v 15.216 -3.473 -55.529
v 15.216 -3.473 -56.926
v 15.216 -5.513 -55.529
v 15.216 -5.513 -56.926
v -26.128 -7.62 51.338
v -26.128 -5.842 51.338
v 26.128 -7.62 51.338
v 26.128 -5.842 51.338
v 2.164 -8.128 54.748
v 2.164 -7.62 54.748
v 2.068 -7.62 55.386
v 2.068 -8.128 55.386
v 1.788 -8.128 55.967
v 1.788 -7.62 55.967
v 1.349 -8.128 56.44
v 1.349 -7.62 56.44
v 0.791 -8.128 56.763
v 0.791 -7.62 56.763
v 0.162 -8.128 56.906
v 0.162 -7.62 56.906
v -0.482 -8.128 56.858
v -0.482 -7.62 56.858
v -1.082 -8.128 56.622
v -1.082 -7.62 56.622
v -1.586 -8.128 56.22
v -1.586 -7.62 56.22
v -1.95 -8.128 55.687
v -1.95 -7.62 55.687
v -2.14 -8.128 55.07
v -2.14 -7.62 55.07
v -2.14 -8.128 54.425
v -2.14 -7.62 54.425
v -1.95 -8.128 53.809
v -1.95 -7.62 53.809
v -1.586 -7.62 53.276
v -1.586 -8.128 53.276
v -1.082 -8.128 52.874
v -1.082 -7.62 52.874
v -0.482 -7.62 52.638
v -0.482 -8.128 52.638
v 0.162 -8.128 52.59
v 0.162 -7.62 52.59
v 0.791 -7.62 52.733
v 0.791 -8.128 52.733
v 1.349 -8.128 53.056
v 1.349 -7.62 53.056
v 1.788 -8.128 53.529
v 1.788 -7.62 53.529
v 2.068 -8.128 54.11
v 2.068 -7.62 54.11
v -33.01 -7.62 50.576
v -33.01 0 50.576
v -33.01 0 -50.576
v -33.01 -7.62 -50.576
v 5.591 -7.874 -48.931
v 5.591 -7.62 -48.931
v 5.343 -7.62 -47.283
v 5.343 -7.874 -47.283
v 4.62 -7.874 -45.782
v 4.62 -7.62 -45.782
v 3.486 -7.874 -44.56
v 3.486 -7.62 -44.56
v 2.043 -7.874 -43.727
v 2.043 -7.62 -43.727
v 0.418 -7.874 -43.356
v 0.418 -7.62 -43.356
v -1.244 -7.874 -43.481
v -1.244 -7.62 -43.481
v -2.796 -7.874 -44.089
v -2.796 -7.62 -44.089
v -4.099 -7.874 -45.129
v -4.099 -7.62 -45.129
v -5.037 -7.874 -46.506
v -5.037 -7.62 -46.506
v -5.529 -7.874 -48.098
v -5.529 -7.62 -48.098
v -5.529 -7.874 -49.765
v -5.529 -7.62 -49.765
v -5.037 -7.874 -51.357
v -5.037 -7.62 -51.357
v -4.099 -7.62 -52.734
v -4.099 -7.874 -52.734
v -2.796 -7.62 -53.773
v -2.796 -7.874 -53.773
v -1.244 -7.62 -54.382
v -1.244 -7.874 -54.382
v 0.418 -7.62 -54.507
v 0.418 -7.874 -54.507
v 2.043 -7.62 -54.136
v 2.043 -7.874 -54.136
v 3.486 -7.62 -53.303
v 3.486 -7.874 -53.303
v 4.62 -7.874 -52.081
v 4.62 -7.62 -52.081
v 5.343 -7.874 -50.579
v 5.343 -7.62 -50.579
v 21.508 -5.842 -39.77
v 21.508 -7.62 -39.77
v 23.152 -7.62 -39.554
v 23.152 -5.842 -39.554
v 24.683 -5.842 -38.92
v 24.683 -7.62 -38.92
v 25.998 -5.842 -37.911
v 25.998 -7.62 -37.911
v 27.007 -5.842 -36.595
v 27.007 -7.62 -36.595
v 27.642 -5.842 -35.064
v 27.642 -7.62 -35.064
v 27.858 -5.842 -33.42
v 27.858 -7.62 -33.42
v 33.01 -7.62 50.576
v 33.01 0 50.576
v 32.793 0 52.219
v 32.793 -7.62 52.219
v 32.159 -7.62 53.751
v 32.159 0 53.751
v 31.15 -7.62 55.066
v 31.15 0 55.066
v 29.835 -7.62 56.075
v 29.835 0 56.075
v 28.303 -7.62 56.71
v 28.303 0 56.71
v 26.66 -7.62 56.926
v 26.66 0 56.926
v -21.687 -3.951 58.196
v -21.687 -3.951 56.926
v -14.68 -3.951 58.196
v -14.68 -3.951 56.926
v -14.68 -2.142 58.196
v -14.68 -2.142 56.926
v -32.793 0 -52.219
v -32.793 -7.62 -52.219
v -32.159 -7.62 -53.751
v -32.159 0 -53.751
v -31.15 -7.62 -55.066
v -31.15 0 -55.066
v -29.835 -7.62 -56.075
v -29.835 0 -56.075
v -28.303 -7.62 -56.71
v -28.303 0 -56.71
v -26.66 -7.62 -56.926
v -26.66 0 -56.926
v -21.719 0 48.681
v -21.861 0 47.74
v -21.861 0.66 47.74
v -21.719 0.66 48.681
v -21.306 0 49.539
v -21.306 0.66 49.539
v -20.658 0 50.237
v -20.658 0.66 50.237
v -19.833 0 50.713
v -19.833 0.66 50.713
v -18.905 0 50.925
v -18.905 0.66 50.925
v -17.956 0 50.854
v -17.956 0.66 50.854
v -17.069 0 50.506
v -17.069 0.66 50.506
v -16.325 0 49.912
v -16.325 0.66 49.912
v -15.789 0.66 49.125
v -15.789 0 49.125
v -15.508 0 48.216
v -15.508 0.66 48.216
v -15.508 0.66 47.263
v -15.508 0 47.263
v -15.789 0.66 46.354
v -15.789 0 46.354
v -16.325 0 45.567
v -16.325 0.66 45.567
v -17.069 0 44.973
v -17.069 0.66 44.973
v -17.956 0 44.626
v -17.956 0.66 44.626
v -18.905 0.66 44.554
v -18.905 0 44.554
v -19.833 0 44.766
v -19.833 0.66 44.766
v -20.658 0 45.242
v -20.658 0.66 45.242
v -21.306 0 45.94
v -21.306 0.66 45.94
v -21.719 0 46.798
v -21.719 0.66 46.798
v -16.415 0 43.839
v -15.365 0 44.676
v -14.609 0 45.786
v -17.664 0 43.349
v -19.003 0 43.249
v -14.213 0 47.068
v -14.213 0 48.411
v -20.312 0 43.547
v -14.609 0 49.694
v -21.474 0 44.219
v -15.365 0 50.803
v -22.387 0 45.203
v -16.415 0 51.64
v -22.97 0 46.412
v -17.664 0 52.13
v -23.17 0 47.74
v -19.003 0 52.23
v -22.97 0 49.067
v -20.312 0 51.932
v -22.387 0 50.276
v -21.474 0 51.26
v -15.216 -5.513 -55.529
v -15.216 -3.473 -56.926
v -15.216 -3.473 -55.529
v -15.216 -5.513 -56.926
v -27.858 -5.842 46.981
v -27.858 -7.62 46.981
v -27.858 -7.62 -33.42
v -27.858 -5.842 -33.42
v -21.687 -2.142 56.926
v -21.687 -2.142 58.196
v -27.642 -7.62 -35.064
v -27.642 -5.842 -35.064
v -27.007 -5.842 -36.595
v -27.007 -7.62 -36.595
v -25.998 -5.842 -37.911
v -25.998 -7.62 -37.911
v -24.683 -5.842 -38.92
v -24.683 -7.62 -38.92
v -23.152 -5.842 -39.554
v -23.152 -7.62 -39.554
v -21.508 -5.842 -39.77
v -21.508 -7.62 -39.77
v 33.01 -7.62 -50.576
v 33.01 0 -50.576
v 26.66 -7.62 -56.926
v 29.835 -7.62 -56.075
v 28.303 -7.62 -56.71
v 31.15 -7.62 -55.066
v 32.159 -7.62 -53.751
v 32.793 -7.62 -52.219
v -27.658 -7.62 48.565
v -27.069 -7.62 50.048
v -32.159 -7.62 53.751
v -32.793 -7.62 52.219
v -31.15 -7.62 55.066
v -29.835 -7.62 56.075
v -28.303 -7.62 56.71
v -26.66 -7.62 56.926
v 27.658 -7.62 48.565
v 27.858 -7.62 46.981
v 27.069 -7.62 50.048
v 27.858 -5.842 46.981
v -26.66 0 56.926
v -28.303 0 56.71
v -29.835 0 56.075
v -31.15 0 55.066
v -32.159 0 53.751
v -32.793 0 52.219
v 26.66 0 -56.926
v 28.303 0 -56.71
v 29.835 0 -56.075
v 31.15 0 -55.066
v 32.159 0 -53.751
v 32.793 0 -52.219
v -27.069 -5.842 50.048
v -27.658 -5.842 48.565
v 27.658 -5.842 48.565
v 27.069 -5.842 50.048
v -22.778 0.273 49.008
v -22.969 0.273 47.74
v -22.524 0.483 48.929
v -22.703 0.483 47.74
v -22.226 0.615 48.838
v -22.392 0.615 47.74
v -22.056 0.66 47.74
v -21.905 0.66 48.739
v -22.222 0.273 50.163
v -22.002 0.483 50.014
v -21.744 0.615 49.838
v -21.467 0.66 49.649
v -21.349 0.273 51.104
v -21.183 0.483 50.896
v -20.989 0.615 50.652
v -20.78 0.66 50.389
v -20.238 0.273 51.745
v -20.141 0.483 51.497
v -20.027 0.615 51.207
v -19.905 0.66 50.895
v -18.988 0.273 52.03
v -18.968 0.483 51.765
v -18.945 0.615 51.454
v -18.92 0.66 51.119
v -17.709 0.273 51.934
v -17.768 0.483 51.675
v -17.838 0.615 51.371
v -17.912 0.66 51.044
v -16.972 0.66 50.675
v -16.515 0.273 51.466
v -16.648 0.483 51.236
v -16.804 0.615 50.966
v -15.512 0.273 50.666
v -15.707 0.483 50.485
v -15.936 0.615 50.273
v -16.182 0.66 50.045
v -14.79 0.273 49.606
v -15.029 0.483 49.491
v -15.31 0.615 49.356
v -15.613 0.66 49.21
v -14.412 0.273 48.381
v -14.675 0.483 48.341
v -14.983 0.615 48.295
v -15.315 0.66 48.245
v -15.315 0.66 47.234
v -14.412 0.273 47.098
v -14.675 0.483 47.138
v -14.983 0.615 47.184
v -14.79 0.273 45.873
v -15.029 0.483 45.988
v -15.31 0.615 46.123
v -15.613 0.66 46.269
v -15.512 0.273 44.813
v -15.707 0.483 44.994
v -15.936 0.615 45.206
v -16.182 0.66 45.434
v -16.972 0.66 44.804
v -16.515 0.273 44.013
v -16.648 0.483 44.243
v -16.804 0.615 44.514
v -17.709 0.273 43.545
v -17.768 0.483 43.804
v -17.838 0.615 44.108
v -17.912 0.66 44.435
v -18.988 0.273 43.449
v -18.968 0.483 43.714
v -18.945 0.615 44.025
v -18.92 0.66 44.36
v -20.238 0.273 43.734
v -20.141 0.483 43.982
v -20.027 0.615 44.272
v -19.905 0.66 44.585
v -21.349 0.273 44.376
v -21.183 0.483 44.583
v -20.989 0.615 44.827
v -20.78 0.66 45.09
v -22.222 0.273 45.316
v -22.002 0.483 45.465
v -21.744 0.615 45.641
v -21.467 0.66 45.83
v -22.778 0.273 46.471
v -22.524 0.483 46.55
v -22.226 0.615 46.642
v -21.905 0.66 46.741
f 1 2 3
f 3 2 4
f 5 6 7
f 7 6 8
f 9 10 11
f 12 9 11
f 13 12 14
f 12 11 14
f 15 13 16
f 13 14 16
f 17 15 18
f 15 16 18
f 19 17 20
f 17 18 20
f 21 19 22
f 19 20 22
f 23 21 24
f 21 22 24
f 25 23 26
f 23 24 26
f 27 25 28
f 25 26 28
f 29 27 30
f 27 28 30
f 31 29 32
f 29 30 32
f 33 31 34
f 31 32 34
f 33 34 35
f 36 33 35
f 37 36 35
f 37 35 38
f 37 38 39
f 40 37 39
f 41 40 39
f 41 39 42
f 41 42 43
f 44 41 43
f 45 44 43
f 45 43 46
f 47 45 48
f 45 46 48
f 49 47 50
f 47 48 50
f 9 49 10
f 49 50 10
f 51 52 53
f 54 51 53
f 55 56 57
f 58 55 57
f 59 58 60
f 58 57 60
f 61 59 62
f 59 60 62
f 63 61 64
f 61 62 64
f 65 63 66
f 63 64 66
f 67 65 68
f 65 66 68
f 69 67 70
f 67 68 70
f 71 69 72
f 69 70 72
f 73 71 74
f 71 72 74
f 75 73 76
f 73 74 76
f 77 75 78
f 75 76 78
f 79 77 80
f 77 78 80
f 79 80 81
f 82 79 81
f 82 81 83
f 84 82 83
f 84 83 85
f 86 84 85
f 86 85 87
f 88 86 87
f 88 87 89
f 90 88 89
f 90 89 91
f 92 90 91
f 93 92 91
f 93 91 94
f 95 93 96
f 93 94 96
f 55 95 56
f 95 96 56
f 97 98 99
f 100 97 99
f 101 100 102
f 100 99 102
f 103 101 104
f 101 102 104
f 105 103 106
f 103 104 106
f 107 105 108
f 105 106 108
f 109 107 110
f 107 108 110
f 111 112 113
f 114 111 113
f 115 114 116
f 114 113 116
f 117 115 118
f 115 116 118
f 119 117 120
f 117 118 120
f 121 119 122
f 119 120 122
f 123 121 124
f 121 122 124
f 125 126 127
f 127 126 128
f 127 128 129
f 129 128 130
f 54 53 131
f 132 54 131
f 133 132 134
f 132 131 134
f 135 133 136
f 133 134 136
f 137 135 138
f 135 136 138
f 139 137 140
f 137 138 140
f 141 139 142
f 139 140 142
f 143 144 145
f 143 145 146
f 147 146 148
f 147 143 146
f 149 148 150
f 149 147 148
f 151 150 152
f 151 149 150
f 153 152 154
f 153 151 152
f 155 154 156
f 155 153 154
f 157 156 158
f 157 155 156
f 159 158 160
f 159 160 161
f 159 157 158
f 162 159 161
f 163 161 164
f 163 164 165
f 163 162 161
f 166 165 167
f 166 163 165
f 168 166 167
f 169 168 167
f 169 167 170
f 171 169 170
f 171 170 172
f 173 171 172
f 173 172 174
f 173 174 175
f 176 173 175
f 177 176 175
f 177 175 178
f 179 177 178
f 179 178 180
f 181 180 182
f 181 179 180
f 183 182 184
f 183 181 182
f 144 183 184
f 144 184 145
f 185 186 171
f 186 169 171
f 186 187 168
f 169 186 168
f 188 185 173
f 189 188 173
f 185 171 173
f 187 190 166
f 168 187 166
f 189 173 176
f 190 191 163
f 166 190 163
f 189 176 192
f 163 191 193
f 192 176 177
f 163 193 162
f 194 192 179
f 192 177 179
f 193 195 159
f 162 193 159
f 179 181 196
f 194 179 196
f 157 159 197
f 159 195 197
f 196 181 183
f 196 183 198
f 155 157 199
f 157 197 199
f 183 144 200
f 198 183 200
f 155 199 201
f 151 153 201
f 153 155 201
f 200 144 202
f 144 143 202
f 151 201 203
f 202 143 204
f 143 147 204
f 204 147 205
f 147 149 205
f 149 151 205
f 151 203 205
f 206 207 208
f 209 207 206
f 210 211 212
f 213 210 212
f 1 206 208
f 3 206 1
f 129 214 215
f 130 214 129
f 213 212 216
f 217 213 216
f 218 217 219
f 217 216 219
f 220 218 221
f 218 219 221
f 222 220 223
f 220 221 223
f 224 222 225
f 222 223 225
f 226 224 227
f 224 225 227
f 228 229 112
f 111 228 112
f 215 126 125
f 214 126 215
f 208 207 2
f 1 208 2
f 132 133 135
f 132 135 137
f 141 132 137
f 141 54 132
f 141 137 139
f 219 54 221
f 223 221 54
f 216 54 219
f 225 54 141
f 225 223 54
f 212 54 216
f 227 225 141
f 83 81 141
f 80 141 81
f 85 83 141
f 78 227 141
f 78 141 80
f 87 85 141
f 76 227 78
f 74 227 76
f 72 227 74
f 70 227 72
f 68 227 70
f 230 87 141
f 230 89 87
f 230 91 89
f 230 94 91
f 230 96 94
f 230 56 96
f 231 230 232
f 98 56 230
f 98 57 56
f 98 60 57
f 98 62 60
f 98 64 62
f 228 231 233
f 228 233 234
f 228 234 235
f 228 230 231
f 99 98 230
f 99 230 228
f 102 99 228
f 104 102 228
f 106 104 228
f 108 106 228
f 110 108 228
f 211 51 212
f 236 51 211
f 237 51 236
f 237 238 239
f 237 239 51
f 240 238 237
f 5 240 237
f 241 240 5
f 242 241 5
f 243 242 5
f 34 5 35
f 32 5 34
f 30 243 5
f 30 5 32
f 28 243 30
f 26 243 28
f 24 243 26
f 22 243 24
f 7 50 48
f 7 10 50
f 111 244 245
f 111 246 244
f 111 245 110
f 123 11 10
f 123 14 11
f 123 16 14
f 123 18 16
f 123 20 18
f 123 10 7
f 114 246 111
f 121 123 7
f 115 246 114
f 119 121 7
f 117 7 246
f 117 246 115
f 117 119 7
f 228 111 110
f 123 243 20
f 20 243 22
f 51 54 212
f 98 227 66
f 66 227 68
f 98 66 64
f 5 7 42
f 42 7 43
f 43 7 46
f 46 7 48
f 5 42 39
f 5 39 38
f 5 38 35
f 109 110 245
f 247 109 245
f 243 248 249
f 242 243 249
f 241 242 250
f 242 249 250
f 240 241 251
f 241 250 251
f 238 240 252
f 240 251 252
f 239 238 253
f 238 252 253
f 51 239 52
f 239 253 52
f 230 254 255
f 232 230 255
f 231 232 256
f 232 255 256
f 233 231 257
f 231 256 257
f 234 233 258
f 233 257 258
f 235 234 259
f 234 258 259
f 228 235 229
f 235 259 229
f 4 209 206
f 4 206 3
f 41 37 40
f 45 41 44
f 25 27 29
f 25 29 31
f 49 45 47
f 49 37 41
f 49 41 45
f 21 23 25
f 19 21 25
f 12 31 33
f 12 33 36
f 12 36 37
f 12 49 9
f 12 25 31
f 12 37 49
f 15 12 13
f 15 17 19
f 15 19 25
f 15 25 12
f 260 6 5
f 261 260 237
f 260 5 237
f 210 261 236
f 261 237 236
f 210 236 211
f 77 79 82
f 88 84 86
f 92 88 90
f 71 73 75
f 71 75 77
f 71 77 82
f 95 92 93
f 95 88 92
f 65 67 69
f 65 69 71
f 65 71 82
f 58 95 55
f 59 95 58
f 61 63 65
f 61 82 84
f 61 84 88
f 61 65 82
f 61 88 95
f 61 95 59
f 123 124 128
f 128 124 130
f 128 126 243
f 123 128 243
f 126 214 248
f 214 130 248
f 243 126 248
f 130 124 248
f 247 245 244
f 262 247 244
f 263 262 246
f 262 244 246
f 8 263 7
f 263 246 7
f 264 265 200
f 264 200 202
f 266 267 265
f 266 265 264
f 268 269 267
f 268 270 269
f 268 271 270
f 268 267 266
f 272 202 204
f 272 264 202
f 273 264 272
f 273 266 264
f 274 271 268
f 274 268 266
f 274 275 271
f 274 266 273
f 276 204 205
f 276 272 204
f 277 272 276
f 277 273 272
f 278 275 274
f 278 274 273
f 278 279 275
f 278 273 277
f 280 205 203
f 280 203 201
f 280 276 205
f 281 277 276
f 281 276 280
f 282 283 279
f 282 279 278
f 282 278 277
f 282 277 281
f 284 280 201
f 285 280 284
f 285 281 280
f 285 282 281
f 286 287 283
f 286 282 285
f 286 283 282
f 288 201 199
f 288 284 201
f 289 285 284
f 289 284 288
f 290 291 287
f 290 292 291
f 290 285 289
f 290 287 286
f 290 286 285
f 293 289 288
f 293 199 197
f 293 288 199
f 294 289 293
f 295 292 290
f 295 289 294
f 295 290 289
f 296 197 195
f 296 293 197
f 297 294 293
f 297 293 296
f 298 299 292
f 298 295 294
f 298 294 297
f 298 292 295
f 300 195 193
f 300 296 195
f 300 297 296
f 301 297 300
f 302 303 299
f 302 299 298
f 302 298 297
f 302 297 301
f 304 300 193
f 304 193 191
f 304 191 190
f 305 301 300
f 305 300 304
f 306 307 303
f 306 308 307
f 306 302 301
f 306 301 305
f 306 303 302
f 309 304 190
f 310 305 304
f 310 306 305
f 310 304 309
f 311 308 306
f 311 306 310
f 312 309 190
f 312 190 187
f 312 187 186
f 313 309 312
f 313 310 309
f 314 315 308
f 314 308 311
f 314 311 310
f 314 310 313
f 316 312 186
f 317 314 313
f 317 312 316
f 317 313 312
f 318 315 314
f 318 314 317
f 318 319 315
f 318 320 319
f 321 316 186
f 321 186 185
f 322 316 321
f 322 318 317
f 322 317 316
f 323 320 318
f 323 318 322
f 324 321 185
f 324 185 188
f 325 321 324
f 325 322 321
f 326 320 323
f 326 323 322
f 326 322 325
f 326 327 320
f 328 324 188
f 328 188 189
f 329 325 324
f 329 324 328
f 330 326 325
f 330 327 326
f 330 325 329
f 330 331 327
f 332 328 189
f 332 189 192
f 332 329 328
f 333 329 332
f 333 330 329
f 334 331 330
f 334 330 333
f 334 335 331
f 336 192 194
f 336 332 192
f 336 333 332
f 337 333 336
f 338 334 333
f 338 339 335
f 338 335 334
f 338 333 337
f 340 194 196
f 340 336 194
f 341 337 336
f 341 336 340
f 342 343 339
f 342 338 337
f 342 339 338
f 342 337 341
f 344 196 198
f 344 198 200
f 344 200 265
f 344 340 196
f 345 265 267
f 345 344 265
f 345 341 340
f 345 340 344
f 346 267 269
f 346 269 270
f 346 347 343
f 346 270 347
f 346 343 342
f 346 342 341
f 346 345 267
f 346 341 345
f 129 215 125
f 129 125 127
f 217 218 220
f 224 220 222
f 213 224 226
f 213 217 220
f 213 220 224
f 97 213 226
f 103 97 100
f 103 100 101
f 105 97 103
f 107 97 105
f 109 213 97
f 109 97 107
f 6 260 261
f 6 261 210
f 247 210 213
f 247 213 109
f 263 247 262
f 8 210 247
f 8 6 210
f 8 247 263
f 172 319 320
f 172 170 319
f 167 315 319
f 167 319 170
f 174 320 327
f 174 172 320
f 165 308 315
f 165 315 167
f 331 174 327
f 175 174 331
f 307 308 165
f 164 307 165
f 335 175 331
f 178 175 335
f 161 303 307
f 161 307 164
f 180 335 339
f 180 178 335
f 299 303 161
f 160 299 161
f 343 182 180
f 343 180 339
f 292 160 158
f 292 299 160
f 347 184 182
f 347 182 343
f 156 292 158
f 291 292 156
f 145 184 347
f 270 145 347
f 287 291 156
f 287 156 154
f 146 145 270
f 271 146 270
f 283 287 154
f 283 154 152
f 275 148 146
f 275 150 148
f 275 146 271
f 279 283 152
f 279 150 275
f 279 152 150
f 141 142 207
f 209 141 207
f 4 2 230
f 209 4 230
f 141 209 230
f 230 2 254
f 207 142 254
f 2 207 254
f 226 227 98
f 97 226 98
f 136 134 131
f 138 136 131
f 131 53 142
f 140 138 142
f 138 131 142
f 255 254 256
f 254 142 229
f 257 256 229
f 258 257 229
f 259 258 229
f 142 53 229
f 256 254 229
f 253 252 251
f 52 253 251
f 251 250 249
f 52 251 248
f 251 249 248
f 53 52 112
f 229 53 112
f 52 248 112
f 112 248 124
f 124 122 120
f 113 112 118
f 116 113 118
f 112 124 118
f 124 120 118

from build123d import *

# Parameters (mm, degrees)
F1_DEPTH   = 7.62
F3_DEPTH   = 1.778
F4_R       = 5.5910358915
F6_DEPTH   = 0.254
F11_W      = 5.8401450515
F11_H      = 0.8899270086
F12_DEPTH  = 0.254
F13_W      = 53.3195276141
F13_H      = 7.62
F13_W_2    = 3.7960950285
F13_H_2    = 0.8621166
F14_DEPTH  = 5.588
F15_W      = 5.4543595761
F15_H      = 1.4679813758
F16_DEPTH  = 2.921
F17_W      = 7.0071518421
F17_H      = 1.8082973547
F18_DEPTH  = 1.27
F19_R      = 2.1642296788
F20_DEPTH  = 0.508
F21_R      = 3.8279673228
F22_DEPTH  = 2.286
F23_R      = 4.5034446875
F23_R_2    = 3.1940667159
F24_DEPTH  = 0.6604
F26_W      = 9.0522272512
F26_H      = 1.7520438414
F27_DEPTH  = 12.192
F1_FACE2_W = 53.3195276141
F1_FACE2_H = 7.62
F28_DEPTH  = 1.27
F29_W      = 17.2284310684
F29_H      = 1.4600362629
F30_DEPTH  = 3.048
F31_W      = 53.3195276141
F31_H      = 7.62
F31_W_2    = 12.5563140027
F31_H_2    = 1.4600367285
F32_DEPTH  = 1.27
F33_W      = 30.4326713085
F33_H      = 2.039485611
F34_DEPTH  = 1.27
F35_DEPTH  = 2.667


# Not quite as in the source:
# - a fillet or chamfer that OpenCascade refuses, or shapes differently, is made with other operations: its cross-section is extruded or revolved along the edge and cut away or added
# - the program builds the solid bodies; features that only make, move or delete a surface that nothing else refers to are left out


with BuildPart() as f1:
    # F0 (on Front) → F1 (new body)
    with BuildSketch(Plane.XZ):
        with BuildLine():
            ThreePointArc((33.0097638071, 50.5758779287), (31.1498918676, 55.0660059893), (26.6597638071, 56.9258779287))
            Line((26.6597638071, 56.9258779287), (-26.6597638071, 56.9258779287))
            ThreePointArc((-26.6597638071, 56.9258779287), (-31.1498918676, 55.0660059893), (-33.0097638071, 50.5758779287))
            Line((-33.0097638071, 50.5758779287), (-33.0097638071, -50.5758779287))
            ThreePointArc((-33.0097638071, -50.5758779287), (-31.1498918676, -55.0660059893), (-26.6597638071, -56.9258779287))
            Line((-26.6597638071, -56.9258779287), (26.6597638071, -56.9258779287))
            ThreePointArc((26.6597638071, -56.9258779287), (31.1498918676, -55.0660059893), (33.0097638071, -50.5758779287))
            Line((33.0097638071, -50.5758779287), (33.0097638071, 50.5758779287))
        make_face()
    extrude(amount=F1_DEPTH)

    # F2 (on face) → F3 (cut)
    with BuildSketch(Plane.XZ.offset(7.62)):
        with BuildLine():
            ThreePointArc((27.8582237661, 46.9814757049), (25.9983518266, 51.4716037654), (21.5082237661, 53.3314757049))
            Line((21.5082237661, 53.3314757049), (-21.5082237661, 53.3314757049))
            ThreePointArc((-21.5082237661, 53.3314757049), (-25.9983518266, 51.4716037654), (-27.8582237661, 46.9814757049))
            Line((-27.8582237661, 46.9814757049), (-27.8582237661, -33.4204429924))
            ThreePointArc((-27.8582237661, -33.4204429924), (-25.9983518266, -37.910571053), (-21.5082237661, -39.7704429924))
            Line((-21.5082237661, -39.7704429924), (21.5082237661, -39.7704429924))
            ThreePointArc((21.5082237661, -39.7704429924), (25.9983518266, -37.910571053), (27.8582237661, -33.4204429924))
            Line((27.8582237661, -33.4204429924), (27.8582237661, 46.9814757049))
        make_face()
    extrude(amount=-F3_DEPTH, mode=Mode.SUBTRACT)

    # F4 (on face) → F6 (join)
    with BuildSketch(Plane.XZ.offset(7.62)):
        with Locations((0, -48.9313825965)):
            Circle(F4_R)
    extrude(amount=F6_DEPTH)

    # F11 (on face) → F12 (join)
    with BuildSketch(Plane.XY.offset(56.9258779287)):
        with Locations((20.8248868585, -3.3650364957)):
            Rectangle(F11_W, F11_H)
    extrude(amount=-F12_DEPTH)

    # F13 (on face) → F14 (join)
    with BuildSketch(Plane.XY.offset(56.9258779287)):
        with Locations((0, -3.81)):
            Rectangle(F13_W, F13_H)
        with Locations((21.5549049899, -4.2410583)):
            Rectangle(F13_W_2, F13_H_2, mode=Mode.SUBTRACT)
    extrude(amount=-F14_DEPTH)

    # F15 (on face) → F16 (join)
    with BuildSketch(Plane.XY.offset(56.9258779287)):
        with Locations((18.7206258997, -3.3238437027)):
            Rectangle(F15_W, F15_H)
    extrude(amount=-F16_DEPTH)

    # F17 (on face) → F18 (join)
    with BuildSketch(Plane.XY.offset(56.9258779287)):
        with Locations((-18.1839093566, -3.046388505)):
            Rectangle(F17_W, F17_H)
    extrude(amount=F18_DEPTH)

    # F19 (on face) → F20 (join)
    with BuildSketch(Plane.XZ.offset(7.62)):
        with Locations((0, 54.7479093075)):
            Circle(F19_R)
    extrude(amount=F20_DEPTH)

    # F21 (on face) → F22 (join)
    with BuildSketch(Plane(origin=(0, 0, 0), x_dir=(-1, 0, 0), z_dir=(0, 1, 0))):
        with Locations((24.0557044744, 50.6977252662)):
            Circle(F21_R)
    extrude(amount=-F22_DEPTH)

    # F26 (on face) → F27 (join)
    with BuildSketch(Plane(origin=(0, 0, -56.9258779287), x_dir=(1, 0, 0), z_dir=(0, 0, -1))):
        with Locations((1.1143940501, 4.3801093707)):
            Rectangle(F26_W, F26_H)
    extrude(amount=-F27_DEPTH)

    # F1_face2 (on face) + F26 (on face) → F28 (join)
    with BuildSketch(Plane(origin=(0, -3.81, -56.9258779287), x_dir=(1, 0, 0), z_dir=(0, 0, -1))):
        Rectangle(F1_FACE2_W, F1_FACE2_H)
    with BuildSketch(Plane(origin=(0, 0, -56.9258779287), x_dir=(1, 0, 0), z_dir=(0, 0, -1))):
        with Locations((1.1143940501, 4.3801093707)):
            Rectangle(F26_W, F26_H)
    extrude(amount=-F28_DEPTH)

    # F29 (on face) → F30 (join)
    with BuildSketch(Plane(origin=(0, 0, -56.9258779287), x_dir=(1, 0, 0), z_dir=(0, 0, -1))):
        with Locations((1.1143931188, 4.52611316)):
            Rectangle(F29_W, F29_H)
    extrude(amount=-F30_DEPTH)

    # F31 (on face) → F32 (join)
    with BuildSketch(Plane(origin=(0, 0, -56.9258779287), x_dir=(1, 0, 0), z_dir=(0, 0, -1))):
        with Locations((0, 3.81)):
            Rectangle(F31_W, F31_H)
        with Locations((2.5744300801, 4.8181207385)):
            Rectangle(F31_W_2, F31_H_2, mode=Mode.SUBTRACT)
    extrude(amount=-F32_DEPTH)

    # F33 (on face) → F34 (join)
    with BuildSketch(Plane(origin=(0, 0, -56.9258779287), x_dir=(1, 0, 0), z_dir=(0, 0, -1))):
        with Locations((0, 4.492924083)):
            Rectangle(F33_W, F33_H)
    extrude(amount=F34_DEPTH)

    # F35 (cut): a face of the model
    f35_faces = [f1.faces().sort_by_distance(p)[0] for p in [
        (0, -4.492924083, -58.1958779287),
    ]]
    extrude(f35_faces, amount=-F35_DEPTH, mode=Mode.SUBTRACT)


with BuildPart() as f24:
    # F23 (on face) → F24 (new body)
    with BuildSketch(Plane(origin=(0, 0, 0), x_dir=(-1, 0, 0), z_dir=(0, 1, 0))):
        with Locations((18.6664909124, 47.739546746)):
            Circle(F23_R)
        with Locations((18.6664909124, 47.739546746)):
            Circle(F23_R_2, mode=Mode.SUBTRACT)
    extrude(amount=F24_DEPTH)

    # F25: fillet of radius 1.27 on 1 edges, made by hand

    # F25_s1 → F25_t2 (revolve, cut)
    with BuildSketch(Plane.XY.offset(47.739546746)):
        with BuildLine():
            ThreePointArc((-23.1699356, 0), (-22.7033800985, 0.4828953089), (-22.0558046202, 0.6604))
            Line((-22.0558046202, 0.6604), (-23.1699356, 0.6604))
            Line((-23.1699356, 0.6604), (-23.1699356, 0))
        make_face()
    revolve(axis=Axis((-18.6664909124, 0.6604, 47.739546746), (0, 1, 0)), mode=Mode.SUBTRACT)


solid = Compound([f1.part, f24.part])
